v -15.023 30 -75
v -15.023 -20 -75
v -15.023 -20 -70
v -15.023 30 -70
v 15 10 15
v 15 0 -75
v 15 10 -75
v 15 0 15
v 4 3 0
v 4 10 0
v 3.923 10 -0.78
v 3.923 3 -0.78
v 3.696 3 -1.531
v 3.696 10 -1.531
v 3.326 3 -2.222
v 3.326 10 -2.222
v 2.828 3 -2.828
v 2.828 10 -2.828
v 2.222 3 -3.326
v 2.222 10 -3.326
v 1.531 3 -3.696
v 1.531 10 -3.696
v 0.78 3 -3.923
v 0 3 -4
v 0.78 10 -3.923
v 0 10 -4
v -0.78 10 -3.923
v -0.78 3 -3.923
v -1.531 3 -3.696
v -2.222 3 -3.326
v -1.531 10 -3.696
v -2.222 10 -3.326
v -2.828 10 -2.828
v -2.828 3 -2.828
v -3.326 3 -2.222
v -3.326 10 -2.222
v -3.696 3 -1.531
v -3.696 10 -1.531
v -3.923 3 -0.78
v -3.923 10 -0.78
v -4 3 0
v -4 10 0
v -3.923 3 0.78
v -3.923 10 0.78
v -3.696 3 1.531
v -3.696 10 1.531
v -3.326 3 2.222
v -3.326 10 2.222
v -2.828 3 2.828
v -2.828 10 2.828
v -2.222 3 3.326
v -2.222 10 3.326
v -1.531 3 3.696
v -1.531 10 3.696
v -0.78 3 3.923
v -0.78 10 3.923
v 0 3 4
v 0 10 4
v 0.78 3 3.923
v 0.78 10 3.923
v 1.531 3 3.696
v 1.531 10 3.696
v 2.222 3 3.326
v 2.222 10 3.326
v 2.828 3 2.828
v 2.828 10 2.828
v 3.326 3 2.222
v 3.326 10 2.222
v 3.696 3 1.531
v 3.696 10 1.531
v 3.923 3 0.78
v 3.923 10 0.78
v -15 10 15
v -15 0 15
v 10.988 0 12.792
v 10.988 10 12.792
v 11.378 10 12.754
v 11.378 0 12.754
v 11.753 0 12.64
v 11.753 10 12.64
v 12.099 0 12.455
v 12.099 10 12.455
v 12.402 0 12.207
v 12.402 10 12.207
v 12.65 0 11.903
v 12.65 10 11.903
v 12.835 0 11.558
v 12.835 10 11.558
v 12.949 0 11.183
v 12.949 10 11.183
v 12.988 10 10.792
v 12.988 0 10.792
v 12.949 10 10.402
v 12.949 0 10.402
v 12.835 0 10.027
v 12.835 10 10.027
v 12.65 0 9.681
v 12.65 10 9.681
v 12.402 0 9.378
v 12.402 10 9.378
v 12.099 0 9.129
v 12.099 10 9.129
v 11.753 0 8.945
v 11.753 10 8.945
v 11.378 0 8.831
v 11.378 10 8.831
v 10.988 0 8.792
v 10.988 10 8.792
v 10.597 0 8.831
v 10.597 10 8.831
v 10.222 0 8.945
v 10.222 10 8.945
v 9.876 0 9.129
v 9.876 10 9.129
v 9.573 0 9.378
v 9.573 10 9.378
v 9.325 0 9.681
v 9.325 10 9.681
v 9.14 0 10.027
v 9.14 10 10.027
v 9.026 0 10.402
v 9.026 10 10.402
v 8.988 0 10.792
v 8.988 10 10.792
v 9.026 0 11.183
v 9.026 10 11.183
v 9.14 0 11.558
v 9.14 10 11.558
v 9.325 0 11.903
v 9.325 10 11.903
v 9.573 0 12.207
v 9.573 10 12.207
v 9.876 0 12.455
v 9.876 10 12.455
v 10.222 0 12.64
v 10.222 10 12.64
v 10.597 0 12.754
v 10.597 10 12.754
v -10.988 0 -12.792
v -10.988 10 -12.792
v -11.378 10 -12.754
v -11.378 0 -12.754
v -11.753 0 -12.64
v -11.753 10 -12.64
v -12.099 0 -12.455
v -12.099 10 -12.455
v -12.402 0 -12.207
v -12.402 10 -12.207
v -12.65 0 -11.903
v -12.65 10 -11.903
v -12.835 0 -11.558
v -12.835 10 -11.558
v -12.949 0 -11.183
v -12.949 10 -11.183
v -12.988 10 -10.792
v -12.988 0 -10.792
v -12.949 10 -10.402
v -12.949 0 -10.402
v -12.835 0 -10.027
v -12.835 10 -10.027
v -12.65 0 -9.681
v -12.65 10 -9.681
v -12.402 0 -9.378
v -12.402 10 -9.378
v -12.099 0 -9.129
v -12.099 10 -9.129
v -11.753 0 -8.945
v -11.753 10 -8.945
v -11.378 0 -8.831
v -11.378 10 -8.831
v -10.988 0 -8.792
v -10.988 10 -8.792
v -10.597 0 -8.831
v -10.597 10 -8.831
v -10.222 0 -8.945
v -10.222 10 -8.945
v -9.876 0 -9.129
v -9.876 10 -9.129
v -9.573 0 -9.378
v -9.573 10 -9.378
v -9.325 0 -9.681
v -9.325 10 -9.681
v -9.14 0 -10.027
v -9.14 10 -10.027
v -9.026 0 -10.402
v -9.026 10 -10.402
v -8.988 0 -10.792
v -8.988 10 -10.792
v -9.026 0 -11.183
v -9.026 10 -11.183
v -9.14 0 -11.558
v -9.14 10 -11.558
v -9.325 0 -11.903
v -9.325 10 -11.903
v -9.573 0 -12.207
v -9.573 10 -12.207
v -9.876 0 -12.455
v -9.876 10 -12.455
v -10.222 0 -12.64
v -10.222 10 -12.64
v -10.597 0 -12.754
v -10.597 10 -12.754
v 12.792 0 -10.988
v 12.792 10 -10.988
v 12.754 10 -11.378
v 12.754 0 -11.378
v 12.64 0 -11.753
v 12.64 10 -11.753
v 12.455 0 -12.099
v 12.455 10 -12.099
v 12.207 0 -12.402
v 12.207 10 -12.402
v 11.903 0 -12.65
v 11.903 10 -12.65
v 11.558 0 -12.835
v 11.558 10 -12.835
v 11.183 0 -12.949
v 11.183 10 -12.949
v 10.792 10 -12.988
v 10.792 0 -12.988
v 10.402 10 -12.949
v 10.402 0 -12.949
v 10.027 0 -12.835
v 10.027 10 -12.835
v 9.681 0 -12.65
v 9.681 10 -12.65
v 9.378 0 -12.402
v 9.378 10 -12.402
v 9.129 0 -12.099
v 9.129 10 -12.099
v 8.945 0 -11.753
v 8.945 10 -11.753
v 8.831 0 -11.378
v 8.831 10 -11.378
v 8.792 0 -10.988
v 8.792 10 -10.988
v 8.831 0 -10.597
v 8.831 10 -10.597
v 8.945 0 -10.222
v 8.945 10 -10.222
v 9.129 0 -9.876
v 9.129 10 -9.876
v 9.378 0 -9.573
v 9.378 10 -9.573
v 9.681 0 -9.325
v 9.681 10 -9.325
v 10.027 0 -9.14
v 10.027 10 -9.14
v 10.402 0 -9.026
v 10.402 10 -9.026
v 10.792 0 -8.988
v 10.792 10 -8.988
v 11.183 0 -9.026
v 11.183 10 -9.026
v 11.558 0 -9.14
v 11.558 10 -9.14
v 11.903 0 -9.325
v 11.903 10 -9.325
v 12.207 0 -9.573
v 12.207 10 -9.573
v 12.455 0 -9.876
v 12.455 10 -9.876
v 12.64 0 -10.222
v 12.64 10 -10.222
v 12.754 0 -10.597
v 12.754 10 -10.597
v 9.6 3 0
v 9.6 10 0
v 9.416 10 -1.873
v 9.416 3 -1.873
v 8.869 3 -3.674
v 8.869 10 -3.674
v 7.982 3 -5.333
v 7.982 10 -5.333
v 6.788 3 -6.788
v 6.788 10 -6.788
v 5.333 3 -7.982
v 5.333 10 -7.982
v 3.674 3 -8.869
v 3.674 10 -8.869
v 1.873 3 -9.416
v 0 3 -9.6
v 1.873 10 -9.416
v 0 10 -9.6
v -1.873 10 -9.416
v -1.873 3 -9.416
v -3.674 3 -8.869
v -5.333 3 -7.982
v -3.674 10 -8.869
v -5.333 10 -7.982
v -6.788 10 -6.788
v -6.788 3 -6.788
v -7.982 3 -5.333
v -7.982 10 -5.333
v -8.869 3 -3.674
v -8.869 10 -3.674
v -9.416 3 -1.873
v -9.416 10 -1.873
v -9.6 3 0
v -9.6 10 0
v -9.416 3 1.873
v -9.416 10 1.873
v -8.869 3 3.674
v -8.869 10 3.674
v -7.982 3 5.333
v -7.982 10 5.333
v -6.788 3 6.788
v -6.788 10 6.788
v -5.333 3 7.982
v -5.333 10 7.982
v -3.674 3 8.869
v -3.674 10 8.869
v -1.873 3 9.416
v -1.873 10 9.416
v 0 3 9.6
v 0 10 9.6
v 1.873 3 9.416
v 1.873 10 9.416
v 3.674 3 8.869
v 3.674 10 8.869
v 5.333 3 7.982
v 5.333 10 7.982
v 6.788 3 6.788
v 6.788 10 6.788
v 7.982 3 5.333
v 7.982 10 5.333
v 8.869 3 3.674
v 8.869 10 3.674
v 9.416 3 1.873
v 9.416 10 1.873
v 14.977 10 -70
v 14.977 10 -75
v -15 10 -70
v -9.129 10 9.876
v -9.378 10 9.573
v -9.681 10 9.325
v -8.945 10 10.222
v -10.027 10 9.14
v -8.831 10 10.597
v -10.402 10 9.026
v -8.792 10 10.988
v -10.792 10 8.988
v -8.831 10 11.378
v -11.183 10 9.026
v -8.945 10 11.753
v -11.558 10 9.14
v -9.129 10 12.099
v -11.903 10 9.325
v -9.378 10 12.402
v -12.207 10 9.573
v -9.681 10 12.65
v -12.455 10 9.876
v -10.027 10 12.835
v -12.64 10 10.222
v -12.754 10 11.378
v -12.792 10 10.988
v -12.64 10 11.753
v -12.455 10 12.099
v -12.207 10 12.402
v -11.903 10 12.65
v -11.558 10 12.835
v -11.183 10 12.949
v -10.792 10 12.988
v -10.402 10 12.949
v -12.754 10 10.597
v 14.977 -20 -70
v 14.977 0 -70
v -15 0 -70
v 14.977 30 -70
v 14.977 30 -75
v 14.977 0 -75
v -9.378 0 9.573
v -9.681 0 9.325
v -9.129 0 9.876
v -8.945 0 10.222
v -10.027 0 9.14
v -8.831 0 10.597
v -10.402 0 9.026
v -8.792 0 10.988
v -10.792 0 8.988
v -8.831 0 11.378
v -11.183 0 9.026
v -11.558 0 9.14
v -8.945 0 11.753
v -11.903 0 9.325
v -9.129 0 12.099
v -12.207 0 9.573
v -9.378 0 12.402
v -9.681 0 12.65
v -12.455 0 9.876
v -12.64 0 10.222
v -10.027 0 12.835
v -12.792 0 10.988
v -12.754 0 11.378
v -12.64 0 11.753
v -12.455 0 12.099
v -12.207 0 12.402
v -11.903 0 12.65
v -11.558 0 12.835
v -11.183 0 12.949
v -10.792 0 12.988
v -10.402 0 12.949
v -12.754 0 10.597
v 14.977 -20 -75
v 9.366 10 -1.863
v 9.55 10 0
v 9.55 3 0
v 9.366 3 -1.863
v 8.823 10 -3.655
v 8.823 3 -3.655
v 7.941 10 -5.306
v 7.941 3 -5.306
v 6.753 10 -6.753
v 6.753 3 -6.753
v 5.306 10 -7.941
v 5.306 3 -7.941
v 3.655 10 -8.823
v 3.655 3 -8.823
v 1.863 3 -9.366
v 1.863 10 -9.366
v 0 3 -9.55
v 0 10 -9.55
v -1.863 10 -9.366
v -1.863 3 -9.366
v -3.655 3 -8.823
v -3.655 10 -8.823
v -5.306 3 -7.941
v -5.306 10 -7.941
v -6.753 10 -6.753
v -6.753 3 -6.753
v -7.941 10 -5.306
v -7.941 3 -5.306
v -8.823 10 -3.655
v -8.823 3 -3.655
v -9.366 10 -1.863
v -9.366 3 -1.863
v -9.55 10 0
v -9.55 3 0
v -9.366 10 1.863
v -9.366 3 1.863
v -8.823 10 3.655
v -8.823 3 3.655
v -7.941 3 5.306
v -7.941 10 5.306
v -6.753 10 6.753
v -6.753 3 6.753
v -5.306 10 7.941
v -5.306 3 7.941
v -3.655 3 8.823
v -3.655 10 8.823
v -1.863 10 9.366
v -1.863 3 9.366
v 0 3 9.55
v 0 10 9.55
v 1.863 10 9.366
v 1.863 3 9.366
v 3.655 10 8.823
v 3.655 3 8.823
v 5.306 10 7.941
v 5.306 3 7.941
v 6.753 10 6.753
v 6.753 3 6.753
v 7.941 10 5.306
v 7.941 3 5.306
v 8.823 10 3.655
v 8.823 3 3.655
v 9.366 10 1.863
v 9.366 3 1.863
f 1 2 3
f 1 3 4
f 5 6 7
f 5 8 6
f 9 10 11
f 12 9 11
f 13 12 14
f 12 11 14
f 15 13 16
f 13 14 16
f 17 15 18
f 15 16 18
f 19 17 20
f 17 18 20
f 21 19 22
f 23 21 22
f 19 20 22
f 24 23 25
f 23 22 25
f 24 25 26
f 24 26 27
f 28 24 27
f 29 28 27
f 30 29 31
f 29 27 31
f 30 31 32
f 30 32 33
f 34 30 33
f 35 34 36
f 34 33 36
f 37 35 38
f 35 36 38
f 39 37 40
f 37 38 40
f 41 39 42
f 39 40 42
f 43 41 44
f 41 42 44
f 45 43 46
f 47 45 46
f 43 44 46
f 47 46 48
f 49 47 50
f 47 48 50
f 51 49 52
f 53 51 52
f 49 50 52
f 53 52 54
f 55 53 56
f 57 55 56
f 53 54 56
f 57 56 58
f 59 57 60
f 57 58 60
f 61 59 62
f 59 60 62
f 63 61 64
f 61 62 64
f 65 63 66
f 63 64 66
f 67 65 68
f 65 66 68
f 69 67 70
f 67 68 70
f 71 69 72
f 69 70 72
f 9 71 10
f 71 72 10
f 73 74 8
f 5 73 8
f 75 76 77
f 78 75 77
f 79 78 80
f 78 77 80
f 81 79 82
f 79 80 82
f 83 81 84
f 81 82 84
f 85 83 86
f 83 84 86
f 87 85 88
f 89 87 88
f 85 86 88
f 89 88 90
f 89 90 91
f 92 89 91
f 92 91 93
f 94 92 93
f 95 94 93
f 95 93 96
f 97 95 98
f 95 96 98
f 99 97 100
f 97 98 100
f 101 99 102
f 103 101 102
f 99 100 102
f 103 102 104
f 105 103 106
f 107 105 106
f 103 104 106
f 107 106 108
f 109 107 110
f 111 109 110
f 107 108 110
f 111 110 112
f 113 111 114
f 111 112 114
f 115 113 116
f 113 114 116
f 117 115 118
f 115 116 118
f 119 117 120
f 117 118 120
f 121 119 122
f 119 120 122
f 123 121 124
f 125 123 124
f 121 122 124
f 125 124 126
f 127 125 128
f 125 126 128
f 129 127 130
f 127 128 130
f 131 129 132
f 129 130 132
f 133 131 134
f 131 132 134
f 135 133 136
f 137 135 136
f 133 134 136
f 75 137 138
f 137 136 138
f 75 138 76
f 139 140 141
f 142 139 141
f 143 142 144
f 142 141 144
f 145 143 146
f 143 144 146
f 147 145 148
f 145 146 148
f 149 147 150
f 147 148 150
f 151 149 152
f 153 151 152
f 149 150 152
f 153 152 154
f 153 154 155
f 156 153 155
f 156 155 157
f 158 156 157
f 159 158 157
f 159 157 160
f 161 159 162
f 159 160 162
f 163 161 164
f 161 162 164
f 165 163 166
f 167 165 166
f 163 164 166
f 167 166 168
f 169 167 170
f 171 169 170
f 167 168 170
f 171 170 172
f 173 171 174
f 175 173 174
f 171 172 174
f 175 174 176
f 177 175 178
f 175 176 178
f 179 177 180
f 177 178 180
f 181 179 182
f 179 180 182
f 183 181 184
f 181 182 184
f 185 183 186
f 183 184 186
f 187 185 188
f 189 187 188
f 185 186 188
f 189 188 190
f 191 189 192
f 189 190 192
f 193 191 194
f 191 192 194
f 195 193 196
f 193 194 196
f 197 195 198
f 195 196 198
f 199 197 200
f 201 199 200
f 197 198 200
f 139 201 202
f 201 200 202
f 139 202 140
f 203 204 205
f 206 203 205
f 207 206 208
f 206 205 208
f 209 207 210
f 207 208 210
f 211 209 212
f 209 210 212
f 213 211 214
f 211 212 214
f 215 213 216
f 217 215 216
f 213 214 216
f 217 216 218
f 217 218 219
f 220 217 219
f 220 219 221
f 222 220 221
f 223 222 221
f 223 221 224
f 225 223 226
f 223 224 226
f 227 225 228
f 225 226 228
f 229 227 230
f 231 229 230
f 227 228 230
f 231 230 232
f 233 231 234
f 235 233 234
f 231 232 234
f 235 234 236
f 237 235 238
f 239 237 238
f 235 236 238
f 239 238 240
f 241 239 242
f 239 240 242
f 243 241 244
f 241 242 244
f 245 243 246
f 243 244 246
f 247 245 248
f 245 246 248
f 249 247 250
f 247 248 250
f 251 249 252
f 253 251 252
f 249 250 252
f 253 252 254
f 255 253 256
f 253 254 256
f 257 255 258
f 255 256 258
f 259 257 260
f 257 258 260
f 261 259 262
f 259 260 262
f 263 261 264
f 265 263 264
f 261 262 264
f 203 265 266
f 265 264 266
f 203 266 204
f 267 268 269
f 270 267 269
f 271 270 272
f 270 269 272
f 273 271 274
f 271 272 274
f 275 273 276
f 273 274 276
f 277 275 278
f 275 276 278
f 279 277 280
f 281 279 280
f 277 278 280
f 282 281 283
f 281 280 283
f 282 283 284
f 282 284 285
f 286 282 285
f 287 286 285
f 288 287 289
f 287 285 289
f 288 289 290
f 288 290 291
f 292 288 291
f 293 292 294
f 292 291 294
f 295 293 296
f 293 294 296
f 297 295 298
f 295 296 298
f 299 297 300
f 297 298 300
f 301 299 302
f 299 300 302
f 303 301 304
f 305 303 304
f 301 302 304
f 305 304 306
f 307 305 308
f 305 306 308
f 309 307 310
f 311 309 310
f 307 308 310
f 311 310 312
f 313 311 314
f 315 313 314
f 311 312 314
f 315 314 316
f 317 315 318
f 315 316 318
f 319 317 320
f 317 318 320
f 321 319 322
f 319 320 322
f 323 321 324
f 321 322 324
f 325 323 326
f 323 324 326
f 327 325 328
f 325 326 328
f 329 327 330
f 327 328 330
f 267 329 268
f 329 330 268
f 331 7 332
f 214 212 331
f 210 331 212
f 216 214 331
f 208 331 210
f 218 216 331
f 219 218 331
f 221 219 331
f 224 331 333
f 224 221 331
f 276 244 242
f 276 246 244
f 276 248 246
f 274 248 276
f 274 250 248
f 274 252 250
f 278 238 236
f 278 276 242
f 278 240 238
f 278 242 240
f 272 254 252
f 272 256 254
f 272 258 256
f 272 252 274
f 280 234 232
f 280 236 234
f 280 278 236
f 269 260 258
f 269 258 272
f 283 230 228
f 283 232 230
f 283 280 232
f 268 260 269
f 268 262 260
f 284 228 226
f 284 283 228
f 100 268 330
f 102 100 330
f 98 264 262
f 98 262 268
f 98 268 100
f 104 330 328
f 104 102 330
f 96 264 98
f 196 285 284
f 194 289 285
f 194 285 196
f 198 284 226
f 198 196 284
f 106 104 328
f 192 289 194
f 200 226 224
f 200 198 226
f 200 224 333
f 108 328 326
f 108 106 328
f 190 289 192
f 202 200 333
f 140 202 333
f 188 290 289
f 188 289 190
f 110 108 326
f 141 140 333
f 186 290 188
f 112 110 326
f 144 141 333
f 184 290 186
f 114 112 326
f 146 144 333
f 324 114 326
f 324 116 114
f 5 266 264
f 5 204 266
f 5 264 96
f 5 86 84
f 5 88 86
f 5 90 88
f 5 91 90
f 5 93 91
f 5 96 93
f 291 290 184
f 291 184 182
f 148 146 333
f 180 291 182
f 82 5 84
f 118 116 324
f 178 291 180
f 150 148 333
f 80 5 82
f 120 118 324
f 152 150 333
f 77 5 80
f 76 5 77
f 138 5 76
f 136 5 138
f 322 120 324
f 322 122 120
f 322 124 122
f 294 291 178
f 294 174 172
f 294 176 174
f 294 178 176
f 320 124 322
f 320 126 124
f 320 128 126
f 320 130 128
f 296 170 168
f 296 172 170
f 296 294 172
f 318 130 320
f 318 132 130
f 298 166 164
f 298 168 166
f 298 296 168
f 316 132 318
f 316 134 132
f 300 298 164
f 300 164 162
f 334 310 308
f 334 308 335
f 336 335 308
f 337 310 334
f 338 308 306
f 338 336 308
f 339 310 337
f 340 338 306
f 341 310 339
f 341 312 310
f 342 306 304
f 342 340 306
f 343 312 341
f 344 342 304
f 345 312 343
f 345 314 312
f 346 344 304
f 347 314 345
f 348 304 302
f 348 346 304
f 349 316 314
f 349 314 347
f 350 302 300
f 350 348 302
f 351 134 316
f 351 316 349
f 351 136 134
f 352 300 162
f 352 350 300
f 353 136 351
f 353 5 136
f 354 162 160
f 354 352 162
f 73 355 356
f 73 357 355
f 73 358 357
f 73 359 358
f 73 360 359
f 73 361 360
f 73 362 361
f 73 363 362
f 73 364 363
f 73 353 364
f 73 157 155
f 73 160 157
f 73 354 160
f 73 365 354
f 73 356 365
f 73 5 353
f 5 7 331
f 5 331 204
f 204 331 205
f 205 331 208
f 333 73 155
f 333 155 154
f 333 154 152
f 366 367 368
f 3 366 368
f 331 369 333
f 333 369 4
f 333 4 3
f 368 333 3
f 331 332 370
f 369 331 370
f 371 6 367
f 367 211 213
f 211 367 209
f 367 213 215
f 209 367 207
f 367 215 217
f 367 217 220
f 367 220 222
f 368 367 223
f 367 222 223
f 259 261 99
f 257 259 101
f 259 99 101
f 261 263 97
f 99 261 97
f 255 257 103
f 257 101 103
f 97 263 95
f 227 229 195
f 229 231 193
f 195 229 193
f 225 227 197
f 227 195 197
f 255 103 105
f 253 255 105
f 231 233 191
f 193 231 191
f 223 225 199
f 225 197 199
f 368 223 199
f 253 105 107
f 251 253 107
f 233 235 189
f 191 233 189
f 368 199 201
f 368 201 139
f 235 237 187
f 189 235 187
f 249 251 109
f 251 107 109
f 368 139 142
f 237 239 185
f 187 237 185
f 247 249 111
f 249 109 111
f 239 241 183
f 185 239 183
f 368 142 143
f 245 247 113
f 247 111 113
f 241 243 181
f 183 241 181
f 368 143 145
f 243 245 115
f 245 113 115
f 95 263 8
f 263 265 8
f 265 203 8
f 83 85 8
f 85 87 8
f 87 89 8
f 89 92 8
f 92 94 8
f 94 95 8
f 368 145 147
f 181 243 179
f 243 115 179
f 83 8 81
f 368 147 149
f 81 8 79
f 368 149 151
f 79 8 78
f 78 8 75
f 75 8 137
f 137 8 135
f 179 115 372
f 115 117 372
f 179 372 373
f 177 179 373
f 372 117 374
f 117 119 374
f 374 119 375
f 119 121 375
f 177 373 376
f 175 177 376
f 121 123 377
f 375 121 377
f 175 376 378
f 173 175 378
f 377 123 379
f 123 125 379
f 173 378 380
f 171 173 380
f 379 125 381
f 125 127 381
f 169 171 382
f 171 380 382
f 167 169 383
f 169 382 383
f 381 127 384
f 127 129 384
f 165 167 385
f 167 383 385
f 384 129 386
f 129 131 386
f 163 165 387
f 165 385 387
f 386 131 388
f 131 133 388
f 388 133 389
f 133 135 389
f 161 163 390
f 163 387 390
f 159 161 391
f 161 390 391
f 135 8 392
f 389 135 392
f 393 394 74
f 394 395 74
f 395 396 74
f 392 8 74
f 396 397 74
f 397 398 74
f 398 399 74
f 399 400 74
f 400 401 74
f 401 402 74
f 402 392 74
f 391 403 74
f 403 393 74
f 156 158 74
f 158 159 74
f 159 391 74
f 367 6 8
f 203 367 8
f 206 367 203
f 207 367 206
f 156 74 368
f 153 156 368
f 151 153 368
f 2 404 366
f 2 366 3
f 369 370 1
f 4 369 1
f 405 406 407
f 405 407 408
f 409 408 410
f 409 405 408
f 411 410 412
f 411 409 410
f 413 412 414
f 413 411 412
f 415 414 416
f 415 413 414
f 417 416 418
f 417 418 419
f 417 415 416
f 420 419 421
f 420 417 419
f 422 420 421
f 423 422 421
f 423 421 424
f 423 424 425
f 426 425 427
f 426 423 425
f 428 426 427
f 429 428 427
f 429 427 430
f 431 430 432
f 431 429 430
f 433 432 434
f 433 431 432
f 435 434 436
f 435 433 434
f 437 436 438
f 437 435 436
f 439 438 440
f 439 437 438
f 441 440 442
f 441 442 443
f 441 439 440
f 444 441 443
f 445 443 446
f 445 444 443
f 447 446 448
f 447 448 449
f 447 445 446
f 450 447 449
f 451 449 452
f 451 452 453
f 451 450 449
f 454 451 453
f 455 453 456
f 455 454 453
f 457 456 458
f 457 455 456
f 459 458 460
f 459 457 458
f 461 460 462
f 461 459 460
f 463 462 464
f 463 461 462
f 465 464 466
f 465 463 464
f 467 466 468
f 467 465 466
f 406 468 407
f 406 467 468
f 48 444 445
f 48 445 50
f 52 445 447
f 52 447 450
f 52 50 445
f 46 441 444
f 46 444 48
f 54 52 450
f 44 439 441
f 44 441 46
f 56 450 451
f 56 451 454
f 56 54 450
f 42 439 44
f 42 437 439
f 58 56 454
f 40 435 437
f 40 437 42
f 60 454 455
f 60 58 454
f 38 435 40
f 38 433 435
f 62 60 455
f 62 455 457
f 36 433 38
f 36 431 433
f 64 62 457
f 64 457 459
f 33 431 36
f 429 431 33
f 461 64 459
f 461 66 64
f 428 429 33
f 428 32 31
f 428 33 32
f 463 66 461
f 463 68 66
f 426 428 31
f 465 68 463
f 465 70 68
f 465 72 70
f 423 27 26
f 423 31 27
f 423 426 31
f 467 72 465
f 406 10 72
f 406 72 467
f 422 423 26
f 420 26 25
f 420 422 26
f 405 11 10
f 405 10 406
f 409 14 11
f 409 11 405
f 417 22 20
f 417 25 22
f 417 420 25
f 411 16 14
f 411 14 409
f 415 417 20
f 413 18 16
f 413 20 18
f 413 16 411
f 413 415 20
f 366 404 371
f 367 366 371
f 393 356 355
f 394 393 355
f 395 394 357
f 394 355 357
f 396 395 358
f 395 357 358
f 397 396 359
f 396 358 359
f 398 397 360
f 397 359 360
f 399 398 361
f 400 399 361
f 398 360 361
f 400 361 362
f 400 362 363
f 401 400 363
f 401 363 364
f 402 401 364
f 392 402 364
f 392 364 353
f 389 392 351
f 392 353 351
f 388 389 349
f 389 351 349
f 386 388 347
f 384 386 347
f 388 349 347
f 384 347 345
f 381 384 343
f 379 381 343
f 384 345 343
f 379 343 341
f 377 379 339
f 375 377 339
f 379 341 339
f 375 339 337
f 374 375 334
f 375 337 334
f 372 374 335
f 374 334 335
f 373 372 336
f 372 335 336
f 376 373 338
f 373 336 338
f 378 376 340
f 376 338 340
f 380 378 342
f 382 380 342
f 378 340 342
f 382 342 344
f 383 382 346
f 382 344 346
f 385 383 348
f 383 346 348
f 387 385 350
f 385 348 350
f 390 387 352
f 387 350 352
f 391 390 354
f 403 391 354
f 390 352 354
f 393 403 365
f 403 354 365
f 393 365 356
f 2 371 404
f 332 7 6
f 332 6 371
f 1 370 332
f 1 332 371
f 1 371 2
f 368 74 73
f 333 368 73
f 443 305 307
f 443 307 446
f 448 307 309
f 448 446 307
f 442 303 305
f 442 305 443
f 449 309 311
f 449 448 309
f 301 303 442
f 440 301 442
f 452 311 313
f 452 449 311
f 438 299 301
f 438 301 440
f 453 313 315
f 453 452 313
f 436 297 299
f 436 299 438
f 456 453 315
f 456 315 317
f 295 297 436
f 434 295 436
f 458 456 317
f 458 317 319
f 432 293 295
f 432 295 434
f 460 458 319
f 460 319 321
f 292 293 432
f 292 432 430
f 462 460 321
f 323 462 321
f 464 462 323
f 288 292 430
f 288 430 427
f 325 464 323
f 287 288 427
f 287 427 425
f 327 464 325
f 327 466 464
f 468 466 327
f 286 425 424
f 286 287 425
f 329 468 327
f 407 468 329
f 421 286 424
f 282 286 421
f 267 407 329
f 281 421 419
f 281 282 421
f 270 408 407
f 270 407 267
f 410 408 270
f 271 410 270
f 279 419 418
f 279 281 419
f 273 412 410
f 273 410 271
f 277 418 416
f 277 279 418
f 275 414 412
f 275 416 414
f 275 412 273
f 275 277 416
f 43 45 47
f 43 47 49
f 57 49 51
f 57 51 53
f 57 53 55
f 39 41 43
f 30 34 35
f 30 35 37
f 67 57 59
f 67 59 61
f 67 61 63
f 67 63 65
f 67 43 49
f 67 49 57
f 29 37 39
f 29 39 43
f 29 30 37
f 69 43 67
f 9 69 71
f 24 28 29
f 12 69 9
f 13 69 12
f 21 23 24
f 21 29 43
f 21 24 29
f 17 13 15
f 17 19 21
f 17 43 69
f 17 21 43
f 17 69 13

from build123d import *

# Parameters (mm, degrees)
SKETCH1_W           = 30
SKETCH1_H           = 30
BOSS_EXTRUDE1_DEPTH = 10
SKETCH2_R           = 9.6
SKETCH2_R_2         = 9.55
CUT_EXTRUDE1_DEPTH  = 7
SKETCH3_R           = 4
CUT_EXTRUDE2_DEPTH  = 7
SKETCH4_R           = 2
CUT_EXTRUDE3_DEPTH  = 10
CIRPATTERN1_COUNT   = 4
SKETCH5_W           = 30
SKETCH5_H           = 10
BOSS_EXTRUDE2_DEPTH = 60
SKETCH6_W           = 30
SKETCH6_H           = 50
BOSS_EXTRUDE3_DEPTH = 5


with BuildPart() as part:
    # Sketch1 → Boss-Extrude1 (new body)
    with BuildSketch(Plane(origin=(0, 0, 0), x_dir=(1, 0, 0), z_dir=(0, 1, 0))):
        Rectangle(SKETCH1_W, SKETCH1_H)
    extrude(amount=BOSS_EXTRUDE1_DEPTH)

    # Sketch2 → Cut-Extrude1 (cut)
    with BuildSketch(Plane(origin=(0, 10, 0), x_dir=(1, 0, 0), z_dir=(0, 1, 0))):
        Circle(SKETCH2_R)
        Circle(SKETCH2_R_2, mode=Mode.SUBTRACT)
    extrude(amount=-CUT_EXTRUDE1_DEPTH, mode=Mode.SUBTRACT)

    # Sketch3 → Cut-Extrude2 (cut)
    with BuildSketch(Plane(origin=(0, 10, 0), x_dir=(1, 0, 0), z_dir=(0, 1, 0))):
        Circle(SKETCH3_R)
    extrude(amount=-CUT_EXTRUDE2_DEPTH, mode=Mode.SUBTRACT)

    # Sketch4 → Cut-Extrude3 (cut)
    with BuildSketch(Plane(origin=(0, 10, 0), x_dir=(1, 0, 0), z_dir=(0, 1, 0))):
        with Locations((10.792349727, 10.987509758)):
            Circle(SKETCH4_R)
    cut_extrude3 = extrude(amount=-CUT_EXTRUDE3_DEPTH, mode=Mode.SUBTRACT)

    # CirPattern1: Cut-Extrude3 ×4 about axis
    cirpattern1_axis = Axis((0, 0, 0), (0, 1, 0))
    for i in range(1, CIRPATTERN1_COUNT):
        add(cut_extrude3.rotate(cirpattern1_axis, i * 360 / CIRPATTERN1_COUNT), mode=Mode.SUBTRACT)

    # Sketch5 → Boss-Extrude2 (add)
    with BuildSketch(Plane(origin=(0, 0, -15), x_dir=(-1, 0, 0), z_dir=(0, 0, -1))):
        with Locations((0, 5)):
            Rectangle(SKETCH5_W, SKETCH5_H)
    extrude(amount=BOSS_EXTRUDE2_DEPTH)

    # Sketch6 → Boss-Extrude3 (add)
    with BuildSketch(Plane(origin=(0, 0, -75), x_dir=(-1, 0, 0), z_dir=(0, 0, -1))):
        with Locations((0.023044467, 5)):
            Rectangle(SKETCH6_W, SKETCH6_H)
    extrude(amount=-BOSS_EXTRUDE3_DEPTH)


solid = part.part
